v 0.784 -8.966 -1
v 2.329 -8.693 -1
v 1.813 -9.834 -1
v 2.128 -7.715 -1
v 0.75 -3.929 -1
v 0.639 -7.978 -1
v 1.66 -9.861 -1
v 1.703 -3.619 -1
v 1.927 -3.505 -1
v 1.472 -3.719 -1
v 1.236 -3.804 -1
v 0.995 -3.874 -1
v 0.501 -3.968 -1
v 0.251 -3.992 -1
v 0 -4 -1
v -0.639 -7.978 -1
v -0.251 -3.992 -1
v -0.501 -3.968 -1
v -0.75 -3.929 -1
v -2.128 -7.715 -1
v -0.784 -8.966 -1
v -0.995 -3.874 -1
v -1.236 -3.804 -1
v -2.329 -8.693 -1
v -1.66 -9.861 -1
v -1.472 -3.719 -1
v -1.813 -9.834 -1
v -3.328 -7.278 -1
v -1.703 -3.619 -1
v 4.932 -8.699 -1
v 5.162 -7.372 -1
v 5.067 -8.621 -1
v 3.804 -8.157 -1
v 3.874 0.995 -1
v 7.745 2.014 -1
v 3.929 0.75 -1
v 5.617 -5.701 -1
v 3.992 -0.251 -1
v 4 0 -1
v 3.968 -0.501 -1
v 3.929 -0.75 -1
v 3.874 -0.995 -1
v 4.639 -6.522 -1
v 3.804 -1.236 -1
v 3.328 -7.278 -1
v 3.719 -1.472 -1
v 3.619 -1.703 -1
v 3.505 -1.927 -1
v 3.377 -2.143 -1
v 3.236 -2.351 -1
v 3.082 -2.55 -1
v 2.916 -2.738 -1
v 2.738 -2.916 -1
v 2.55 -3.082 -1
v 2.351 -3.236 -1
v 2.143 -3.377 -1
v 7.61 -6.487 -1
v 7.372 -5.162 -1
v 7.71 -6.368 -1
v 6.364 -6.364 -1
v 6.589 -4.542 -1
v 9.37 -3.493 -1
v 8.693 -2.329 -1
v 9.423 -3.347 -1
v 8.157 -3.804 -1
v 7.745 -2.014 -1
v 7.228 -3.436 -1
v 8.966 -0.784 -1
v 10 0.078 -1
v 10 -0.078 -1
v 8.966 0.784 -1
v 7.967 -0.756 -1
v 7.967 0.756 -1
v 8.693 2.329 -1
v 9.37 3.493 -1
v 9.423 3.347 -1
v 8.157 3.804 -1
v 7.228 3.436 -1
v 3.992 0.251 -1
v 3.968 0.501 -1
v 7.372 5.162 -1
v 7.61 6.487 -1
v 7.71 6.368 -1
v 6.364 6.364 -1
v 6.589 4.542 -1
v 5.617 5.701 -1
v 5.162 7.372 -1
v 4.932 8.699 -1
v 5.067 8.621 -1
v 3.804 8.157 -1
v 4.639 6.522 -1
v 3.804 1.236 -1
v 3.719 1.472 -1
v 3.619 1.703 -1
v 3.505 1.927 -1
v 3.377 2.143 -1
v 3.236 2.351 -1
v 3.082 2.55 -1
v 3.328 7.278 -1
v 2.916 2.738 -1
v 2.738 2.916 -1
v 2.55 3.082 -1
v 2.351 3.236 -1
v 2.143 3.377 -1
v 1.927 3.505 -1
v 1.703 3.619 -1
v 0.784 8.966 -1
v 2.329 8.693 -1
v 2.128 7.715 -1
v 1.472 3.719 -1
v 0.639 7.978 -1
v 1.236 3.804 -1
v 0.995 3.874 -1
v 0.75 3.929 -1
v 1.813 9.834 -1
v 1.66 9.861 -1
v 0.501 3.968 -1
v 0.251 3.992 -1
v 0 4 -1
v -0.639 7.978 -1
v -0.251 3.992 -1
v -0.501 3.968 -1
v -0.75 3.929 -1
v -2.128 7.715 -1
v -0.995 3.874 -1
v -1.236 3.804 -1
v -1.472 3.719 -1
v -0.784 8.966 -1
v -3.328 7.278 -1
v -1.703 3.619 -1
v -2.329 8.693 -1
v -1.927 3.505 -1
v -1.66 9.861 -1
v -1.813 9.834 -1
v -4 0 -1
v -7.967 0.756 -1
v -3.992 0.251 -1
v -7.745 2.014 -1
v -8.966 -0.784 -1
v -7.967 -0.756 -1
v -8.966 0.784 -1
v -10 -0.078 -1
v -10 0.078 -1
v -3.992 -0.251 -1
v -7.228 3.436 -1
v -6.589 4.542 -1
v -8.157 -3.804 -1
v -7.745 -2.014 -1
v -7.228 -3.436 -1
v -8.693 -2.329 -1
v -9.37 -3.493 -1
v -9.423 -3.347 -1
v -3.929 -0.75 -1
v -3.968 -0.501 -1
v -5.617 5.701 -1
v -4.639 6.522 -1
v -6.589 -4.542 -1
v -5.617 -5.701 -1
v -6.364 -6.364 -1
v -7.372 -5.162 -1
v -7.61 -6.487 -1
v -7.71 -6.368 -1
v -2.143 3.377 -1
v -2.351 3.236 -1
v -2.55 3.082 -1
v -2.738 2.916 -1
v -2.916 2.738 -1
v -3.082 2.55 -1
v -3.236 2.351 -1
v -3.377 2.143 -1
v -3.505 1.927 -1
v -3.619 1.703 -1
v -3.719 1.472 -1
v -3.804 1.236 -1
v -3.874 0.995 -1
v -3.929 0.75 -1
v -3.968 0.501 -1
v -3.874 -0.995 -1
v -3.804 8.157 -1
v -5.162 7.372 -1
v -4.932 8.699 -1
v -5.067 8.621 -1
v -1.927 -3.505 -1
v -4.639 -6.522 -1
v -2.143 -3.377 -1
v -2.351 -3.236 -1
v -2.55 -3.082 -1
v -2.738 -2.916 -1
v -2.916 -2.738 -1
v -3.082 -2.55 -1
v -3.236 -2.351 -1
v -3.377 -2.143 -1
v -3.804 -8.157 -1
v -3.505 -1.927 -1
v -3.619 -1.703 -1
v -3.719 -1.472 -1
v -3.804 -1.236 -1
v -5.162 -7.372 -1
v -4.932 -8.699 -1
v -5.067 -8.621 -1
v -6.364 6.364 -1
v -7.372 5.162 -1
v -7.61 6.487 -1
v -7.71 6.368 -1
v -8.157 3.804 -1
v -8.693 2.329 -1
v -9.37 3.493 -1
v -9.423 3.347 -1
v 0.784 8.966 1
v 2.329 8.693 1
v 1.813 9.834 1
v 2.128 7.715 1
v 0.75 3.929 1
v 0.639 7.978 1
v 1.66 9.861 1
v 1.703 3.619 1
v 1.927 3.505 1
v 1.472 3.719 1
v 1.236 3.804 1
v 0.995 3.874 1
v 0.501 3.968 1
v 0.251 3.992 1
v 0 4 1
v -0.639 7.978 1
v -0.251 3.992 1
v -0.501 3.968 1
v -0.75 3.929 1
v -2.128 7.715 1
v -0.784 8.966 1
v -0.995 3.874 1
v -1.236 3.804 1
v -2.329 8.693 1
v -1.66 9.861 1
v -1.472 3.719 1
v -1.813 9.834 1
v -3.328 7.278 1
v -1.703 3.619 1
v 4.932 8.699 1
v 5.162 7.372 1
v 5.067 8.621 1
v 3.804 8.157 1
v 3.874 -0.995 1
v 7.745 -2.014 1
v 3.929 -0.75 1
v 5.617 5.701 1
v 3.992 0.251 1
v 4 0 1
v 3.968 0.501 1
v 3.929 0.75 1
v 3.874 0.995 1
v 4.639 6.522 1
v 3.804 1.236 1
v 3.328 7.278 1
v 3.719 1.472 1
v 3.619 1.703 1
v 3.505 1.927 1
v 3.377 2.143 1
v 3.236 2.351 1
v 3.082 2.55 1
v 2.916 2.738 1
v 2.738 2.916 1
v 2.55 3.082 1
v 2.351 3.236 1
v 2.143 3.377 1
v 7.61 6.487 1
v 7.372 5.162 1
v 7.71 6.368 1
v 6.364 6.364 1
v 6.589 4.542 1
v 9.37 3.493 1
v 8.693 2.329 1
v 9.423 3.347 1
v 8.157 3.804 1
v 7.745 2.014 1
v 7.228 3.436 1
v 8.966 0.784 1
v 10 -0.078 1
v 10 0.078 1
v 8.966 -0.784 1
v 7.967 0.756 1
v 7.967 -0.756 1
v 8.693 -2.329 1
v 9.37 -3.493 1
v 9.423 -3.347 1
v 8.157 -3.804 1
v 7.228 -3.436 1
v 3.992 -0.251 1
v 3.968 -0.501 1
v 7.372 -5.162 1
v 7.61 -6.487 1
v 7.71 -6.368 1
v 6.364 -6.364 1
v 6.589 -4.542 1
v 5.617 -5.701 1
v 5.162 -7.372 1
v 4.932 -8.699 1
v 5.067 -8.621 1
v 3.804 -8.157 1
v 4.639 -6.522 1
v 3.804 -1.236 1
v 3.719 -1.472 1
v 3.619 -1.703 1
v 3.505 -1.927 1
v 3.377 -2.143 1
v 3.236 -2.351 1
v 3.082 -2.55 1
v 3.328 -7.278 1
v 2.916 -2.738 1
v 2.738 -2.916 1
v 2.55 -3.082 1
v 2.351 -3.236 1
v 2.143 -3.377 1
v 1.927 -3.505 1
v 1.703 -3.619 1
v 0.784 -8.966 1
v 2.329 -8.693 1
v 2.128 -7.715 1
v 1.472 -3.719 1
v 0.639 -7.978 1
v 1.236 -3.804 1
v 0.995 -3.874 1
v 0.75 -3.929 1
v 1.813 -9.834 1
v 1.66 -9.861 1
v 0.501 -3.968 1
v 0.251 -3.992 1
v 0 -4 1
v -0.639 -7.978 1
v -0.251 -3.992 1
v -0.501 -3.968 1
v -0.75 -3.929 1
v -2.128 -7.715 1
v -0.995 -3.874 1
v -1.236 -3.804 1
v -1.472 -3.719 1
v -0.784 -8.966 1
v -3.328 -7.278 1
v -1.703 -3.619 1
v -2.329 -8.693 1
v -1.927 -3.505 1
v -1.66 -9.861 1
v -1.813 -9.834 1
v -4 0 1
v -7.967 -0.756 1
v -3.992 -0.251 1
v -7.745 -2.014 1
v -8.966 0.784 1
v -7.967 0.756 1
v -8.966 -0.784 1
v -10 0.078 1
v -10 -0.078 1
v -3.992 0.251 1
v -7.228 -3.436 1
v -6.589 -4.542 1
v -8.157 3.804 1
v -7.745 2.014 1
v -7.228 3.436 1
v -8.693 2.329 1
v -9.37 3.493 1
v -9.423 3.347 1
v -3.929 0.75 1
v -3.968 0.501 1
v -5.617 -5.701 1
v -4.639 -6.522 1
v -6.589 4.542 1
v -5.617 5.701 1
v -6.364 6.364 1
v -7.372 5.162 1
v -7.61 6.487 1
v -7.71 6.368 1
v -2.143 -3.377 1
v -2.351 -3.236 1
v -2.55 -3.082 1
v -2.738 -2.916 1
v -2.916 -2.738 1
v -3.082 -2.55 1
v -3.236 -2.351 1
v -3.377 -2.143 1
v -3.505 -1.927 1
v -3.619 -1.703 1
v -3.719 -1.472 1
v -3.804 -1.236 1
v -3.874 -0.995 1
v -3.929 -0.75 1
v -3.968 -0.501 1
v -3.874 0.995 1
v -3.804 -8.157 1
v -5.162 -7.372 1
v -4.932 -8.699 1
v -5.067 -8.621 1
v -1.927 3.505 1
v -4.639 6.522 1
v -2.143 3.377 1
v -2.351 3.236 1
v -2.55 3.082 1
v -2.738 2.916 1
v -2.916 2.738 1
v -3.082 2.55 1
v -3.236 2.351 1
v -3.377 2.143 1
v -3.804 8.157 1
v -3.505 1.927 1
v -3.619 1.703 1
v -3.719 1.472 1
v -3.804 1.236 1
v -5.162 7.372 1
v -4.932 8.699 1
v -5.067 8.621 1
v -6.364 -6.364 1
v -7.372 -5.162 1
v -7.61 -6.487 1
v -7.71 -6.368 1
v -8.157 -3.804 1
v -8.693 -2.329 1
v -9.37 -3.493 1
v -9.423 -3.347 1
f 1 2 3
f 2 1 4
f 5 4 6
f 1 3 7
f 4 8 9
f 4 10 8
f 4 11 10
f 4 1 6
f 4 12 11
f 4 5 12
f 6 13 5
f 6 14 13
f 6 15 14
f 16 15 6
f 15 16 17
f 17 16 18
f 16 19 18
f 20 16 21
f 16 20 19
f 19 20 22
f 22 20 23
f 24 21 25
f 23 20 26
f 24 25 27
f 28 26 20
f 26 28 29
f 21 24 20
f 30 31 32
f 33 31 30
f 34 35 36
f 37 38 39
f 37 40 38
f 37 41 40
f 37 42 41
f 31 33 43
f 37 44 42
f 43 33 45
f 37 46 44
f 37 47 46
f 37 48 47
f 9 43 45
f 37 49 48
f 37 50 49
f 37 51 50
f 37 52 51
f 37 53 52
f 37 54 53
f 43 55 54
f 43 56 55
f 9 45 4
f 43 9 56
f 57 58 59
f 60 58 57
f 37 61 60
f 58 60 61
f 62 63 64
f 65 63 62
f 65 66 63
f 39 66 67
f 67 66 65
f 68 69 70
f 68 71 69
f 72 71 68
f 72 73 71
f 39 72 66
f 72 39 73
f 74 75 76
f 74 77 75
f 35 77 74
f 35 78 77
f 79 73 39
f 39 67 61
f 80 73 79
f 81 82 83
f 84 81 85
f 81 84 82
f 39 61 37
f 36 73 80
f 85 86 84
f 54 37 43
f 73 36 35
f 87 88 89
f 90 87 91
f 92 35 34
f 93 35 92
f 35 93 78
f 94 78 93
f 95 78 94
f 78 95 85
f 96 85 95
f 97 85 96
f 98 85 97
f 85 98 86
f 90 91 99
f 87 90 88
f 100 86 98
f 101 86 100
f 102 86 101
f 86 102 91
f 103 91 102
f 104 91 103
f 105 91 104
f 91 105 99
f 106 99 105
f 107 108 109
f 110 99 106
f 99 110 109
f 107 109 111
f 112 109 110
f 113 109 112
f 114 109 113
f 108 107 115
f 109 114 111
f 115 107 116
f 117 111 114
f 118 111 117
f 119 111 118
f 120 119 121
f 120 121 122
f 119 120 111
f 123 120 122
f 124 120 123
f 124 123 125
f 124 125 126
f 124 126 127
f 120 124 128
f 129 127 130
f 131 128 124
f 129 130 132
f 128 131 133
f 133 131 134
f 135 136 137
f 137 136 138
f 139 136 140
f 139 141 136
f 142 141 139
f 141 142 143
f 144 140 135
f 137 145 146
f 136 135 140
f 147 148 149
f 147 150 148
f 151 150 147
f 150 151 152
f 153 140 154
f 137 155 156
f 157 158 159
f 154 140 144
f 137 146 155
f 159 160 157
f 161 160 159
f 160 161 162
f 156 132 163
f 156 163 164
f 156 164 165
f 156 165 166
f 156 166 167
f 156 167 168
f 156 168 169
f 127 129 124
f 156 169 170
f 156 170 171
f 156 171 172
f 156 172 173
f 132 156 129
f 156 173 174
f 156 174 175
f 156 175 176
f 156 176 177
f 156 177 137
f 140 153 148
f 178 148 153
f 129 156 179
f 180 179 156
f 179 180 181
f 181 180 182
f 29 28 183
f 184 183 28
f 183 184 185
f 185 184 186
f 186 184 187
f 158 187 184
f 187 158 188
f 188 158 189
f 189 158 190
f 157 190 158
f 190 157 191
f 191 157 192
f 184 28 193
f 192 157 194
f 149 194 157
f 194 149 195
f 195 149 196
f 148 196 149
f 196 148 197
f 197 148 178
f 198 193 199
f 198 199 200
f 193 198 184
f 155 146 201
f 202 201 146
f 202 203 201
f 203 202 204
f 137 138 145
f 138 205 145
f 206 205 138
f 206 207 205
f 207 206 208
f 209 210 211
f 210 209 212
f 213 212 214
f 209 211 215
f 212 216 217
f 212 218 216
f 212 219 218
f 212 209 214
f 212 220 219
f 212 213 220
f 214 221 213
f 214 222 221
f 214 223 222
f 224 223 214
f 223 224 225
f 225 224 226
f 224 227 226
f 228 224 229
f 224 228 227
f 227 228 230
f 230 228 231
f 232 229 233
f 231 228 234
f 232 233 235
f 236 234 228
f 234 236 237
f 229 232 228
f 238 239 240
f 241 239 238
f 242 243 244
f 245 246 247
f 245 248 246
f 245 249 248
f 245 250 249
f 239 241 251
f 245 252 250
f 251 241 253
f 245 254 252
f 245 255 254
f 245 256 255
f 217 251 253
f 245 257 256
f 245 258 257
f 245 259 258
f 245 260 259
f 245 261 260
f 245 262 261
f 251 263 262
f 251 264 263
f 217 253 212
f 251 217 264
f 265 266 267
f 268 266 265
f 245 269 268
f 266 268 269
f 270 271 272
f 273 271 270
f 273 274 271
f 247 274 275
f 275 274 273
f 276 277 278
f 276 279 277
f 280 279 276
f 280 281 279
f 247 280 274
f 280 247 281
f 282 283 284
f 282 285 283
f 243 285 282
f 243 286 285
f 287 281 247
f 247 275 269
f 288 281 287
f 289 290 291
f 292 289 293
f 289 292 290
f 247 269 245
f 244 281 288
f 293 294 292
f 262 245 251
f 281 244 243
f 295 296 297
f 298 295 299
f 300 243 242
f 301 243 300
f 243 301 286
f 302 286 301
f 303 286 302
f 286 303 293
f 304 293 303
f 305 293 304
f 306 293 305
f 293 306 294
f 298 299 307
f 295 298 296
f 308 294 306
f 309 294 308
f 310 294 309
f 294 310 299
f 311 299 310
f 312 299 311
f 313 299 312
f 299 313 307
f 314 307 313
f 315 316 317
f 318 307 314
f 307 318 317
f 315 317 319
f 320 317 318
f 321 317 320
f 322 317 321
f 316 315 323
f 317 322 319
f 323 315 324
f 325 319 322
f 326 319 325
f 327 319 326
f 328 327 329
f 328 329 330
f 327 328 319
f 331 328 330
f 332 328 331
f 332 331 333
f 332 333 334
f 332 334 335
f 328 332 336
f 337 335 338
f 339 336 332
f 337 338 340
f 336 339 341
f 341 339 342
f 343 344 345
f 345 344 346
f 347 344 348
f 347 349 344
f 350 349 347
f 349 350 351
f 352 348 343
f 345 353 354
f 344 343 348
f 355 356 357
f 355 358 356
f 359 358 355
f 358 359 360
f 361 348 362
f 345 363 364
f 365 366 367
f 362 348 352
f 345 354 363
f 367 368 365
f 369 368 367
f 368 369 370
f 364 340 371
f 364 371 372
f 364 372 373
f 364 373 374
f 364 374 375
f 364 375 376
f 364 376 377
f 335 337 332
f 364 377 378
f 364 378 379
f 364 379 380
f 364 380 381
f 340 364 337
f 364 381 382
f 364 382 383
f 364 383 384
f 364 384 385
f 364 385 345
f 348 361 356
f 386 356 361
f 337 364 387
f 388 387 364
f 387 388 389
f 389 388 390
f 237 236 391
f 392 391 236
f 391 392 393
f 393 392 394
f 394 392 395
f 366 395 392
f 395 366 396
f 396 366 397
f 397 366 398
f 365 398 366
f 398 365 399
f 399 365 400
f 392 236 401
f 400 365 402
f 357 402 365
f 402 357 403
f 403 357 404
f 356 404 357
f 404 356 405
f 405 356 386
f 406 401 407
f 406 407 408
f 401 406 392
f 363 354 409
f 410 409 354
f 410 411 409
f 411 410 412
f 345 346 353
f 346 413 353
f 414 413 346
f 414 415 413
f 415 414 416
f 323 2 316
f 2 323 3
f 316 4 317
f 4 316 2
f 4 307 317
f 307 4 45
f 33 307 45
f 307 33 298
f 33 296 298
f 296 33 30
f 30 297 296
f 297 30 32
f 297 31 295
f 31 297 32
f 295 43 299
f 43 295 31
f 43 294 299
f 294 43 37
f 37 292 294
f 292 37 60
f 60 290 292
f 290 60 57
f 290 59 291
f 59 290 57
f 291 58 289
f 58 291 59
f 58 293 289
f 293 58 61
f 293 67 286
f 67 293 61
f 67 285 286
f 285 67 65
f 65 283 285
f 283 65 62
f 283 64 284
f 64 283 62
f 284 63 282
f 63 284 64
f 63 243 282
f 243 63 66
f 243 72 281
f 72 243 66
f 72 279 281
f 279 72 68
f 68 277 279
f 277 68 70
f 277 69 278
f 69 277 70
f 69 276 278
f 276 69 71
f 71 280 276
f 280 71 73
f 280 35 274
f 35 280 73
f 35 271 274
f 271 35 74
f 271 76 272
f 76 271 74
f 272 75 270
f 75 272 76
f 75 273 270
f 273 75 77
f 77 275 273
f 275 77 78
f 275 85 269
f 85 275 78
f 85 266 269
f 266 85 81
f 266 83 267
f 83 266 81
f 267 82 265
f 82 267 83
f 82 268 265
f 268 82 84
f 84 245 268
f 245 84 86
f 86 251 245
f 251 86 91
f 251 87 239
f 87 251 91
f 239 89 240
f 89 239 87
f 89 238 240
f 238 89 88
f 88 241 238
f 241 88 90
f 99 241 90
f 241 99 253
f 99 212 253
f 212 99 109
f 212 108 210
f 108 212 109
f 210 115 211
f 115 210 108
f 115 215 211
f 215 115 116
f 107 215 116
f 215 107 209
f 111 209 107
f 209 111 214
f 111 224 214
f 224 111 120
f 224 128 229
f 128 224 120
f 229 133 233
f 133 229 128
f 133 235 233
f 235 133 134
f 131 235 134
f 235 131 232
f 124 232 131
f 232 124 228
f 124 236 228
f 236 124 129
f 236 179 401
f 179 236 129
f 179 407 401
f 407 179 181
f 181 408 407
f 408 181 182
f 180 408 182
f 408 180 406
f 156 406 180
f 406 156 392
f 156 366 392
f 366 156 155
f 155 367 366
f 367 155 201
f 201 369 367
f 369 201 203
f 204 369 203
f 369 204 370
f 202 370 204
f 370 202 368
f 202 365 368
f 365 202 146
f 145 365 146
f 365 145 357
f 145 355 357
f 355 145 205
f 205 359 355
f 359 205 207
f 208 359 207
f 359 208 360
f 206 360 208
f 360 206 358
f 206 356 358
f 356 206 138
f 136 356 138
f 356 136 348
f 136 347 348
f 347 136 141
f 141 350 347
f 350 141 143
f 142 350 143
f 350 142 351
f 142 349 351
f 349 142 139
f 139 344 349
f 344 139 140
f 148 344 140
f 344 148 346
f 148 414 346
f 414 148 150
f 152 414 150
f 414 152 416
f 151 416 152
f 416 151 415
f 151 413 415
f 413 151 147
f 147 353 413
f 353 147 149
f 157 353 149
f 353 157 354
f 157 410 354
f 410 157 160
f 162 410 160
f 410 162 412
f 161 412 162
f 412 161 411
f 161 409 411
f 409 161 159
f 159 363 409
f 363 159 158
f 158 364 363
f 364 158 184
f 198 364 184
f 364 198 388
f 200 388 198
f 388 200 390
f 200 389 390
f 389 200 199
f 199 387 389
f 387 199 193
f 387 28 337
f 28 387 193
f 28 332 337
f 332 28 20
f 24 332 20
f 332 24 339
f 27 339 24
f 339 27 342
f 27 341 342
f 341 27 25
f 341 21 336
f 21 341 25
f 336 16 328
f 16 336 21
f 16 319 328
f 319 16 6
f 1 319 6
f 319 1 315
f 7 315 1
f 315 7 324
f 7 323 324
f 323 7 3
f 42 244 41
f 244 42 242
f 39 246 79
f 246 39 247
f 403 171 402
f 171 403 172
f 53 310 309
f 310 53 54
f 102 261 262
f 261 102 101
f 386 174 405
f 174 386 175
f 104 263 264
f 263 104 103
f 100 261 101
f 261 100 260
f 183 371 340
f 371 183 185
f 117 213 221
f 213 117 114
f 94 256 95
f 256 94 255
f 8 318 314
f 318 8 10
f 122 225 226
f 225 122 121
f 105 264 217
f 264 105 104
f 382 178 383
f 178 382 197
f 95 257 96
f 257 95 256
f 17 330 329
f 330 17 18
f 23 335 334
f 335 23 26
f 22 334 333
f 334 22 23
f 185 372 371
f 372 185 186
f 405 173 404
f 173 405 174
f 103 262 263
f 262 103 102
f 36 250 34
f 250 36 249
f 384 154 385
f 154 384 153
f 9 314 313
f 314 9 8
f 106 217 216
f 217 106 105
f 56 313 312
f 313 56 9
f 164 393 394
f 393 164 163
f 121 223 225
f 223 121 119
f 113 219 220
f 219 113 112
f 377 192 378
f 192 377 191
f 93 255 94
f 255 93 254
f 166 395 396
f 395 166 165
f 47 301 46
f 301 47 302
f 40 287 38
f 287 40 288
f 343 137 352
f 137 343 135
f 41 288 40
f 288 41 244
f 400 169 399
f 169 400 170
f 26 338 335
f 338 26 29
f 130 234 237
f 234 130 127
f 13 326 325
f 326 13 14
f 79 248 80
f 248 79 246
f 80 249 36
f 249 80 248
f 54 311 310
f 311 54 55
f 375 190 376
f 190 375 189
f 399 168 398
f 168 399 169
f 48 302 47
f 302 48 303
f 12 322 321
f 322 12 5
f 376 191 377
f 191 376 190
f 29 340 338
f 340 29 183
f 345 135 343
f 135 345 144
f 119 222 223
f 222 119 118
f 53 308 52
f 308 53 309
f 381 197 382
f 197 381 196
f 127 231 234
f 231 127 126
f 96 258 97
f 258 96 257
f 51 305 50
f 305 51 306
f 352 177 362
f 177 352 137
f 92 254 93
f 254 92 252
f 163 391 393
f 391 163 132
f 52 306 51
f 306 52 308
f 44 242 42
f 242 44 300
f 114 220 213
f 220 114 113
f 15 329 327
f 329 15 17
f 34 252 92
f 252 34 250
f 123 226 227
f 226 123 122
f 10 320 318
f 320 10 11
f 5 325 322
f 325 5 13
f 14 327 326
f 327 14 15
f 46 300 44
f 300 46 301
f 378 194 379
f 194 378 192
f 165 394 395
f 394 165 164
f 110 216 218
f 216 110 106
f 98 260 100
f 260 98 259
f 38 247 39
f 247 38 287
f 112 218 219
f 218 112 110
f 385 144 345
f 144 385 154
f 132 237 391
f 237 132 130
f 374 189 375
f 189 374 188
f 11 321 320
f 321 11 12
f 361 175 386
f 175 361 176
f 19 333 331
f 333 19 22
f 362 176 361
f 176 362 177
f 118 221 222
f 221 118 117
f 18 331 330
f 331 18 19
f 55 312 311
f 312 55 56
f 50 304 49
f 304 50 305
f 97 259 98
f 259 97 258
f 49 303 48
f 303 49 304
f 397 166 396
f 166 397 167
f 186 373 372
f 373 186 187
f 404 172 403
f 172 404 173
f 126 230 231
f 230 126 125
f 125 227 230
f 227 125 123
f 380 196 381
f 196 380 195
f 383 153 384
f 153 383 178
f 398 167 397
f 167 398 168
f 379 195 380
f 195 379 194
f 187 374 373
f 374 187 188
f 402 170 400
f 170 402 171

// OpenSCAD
height = 2;
type = "Spur"; // [Spur,Cog,Double Helix, Single Helix]
teeth = 18;	//	[8:50]

hole = "Yes"; //[Yes,No]
rotate_Offset_double_Helix_only = 5; //[0:20]

holeSize = 4.0;//don't make too big or your gear will disappear
scale = 100;//this is here temperarily I would not reccomend changing!


if (type == "Spur")
{
if(hole == "Yes")
{
hole();
}
else
{
spur();
}
}
else if(type == "Cog")
{
if(hole == "Yes")
{
hole();
}
else
{
cog();
}
}
else if(type == "Double Helix")
{

if(hole == "Yes")
{
hole();
}
else
{
double_helix();
}
}
else if (type == "Single Helix")
{
if(hole == "Yes")
{
hole();
}
else
{
single_helix();
}
}


module gear(number_of_teeth,
		circular_pitch=false, diametral_pitch=false,
		pressure_angle=20, clearance = 0)
{

	//Convert diametrial pitch to our native circular pitch
	circular_pitch = (circular_pitch!=false?circular_pitch:180/diametral_pitch);

	// Pitch diameter: Diameter of pitch circle.
	pitch_diameter  =  number_of_teeth * circular_pitch / 180;
	pitch_radius = pitch_diameter/2;

	// Base Circle
	base_diameter = pitch_diameter*cos(pressure_angle);
	base_radius = base_diameter/2;

	// Diametrial pitch: Number of teeth per unit length.
	pitch_diametrial = number_of_teeth / pitch_diameter;

	// Addendum: Radial distance from pitch circle to outside circle.
	addendum = 1/pitch_diametrial;

	//Outer Circle
	outer_radius = pitch_radius+addendum;
	outer_diameter = outer_radius*2;

	// Dedendum: Radial distance from pitch circle to root diameter
	dedendum = addendum + clearance;

	// Root diameter: Diameter of bottom of tooth spaces.
	root_radius = pitch_radius-dedendum;
	root_diameter = root_radius * 2;

	half_thick_angle = 360 / (4 * number_of_teeth);

	union()
	{
		rotate(half_thick_angle) circle($fn=number_of_teeth*2, r=root_radius*1.001);

		for (i= [1:number_of_teeth])
		//for (i = [0])
		{
			rotate([0,0,i*360/number_of_teeth])
			{
				involute_gear_tooth(
					pitch_radius = pitch_radius,
					root_radius = root_radius,
					base_radius = base_radius-6,
					outer_radius = outer_radius,
					half_thick_angle = half_thick_angle);
			}
		}
	}
}


module involute_gear_tooth(
					pitch_radius,
					root_radius,
					base_radius,
					outer_radius,
					half_thick_angle
					)
{
	pitch_to_base_angle  = involute_intersect_angle( base_radius, pitch_radius );

	outer_to_base_angle = involute_intersect_angle( base_radius/2, outer_radius*1);

	base1 = 0 - pitch_to_base_angle - half_thick_angle;
	pitch1 = 0 - half_thick_angle;
	outer1 = outer_to_base_angle - pitch_to_base_angle - half_thick_angle;

	b1 = polar_to_cartesian([ base1, base_radius ]);
	p1 = polar_to_cartesian([ pitch1, pitch_radius ]);
	o1 = polar_to_cartesian([ outer1, outer_radius ]);

	b2 = polar_to_cartesian([ -base1, base_radius ]);
	p2 = polar_to_cartesian([ -pitch1, pitch_radius ]);
	o2 = polar_to_cartesian([ -outer1, outer_radius ]);

	// ( root_radius > base_radius variables )
		pitch_to_root_angle = pitch_to_base_angle - involute_intersect_angle(base_radius, root_radius );
		root1 = pitch1 - pitch_to_root_angle;
		root2 = -pitch1 + pitch_to_root_angle;
		r1_t =  polar_to_cartesian([ root1, root_radius ]);
		r2_t =  polar_to_cartesian([ -root1, root_radius ]);

	// ( else )
		r1_f =  polar_to_cartesian([ base1, root_radius ]);
		r2_f =  polar_to_cartesian([ -base1, root_radius ]);

	if (root_radius > base_radius)
	{
		//echo("true");
		polygon( points = [
			r1_t,p1,o1,o2,p2,r2_t
		], convexity = 3);
	}
	else
	{
		polygon( points = [
			r1_f, b1,p1,o1,o2,p2,b2,r2_f
		], convexity = 3);
	}

}

// Mathematical Functions
//===============

// Finds the angle of the involute about the base radius at the given distance (radius) from it's center.
//source: http://www.mathhelpforum.com/math-help/geometry/136011-circle-involute-solving-y-any-given-x.html

function involute_intersect_angle(base_radius, radius) = sqrt( pow(radius/base_radius,2) - 1);



// Polar coord [angle, radius] to cartesian coord [x,y]

function polar_to_cartesian(polar) = [
	polar[1]*cos(polar[0]),
	polar[1]*sin(polar[0])
];


// Test Cases
//===============

module test_gears()
{
	gear(number_of_teeth=51,circular_pitch=200);
	translate([0, 50])gear(number_of_teeth=17,circular_pitch=200);
	translate([-50,0]) gear(number_of_teeth=17,diametral_pitch=1);
}
module cog()
{
		gear(number_of_teeth=teeth,diametral_pitch=scale/100);

}
module single_helix()
{
	translate([50,0]);
	{
	linear_extrude(height = height, center = true, convexity = 10, twist = -45)
	 gear(number_of_teeth=teeth,diametral_pitch=scale/100);
	}
}
module double_helix()
{



linear_extrude(height = height, center = true, convexity = 10, twist = -45)
	 gear(number_of_teeth=teeth,diametral_pitch=scale/100);
	translate([0,0,height])
	rotate([0,0,rotate_Offset_double_Helix_only])
 linear_extrude(height = height, center = true, convexity = 10, twist = 45)
	 gear(number_of_teeth=teeth,diametral_pitch=scale/100);

}
module spur()
{

		translate([0,0]) linear_extrude(height = height, center = true, convexity = 10, twist = 0)
	 gear(number_of_teeth=teeth,diametral_pitch=1);


}

module demo_3d_gears()
{
	//double helical gear
	// (helics don't line up perfectly - for display purposes only ;)
	translate([50,0])
	{
	linear_extrude(height = 10, center = true, convexity = 10, twist = -45)
	 gear(number_of_teeth=17,diametral_pitch=1);
	translate([0,0,10]) linear_extrude(height = height, center = true, convexity = 10, twist = 45)
	 gear(number_of_teeth=17,diametral_pitch=1);
	}

	//spur gear
	translate([0,-50]) linear_extrude(height = height, center = true, convexity = 10, twist = 0)
	 gear(number_of_teeth=17,diametral_pitch=1);

}
module hole() {
   difference() {
if(type == "Spur")
{
translate([0,0]) linear_extrude(height = height, center = true, convexity = 10, twist = 0)
	 gear(number_of_teeth=teeth,diametral_pitch=1);
}
else if(type == "Cog")
{
gear(number_of_teeth=teeth,diametral_pitch=scale/100);
}
else if (type == "Double Helix")
{
linear_extrude(height = height, center = true, convexity = 10, twist = -45)
	 gear(number_of_teeth=teeth,diametral_pitch=scale/100);
	translate([0,0,height])
	rotate([0,0,rotate_Offset_double_Helix_only])
 linear_extrude(height = height, center = true, convexity = 10, twist = 45)
	 gear(number_of_teeth=teeth,diametral_pitch=scale/100);

}
else if (type == "Single Helix")
{
linear_extrude(height = height, center = true, convexity = 10, twist = -45)
	 gear(number_of_teeth=teeth,diametral_pitch=scale/100);
}
 rotate ([0,0,0]) cylinder (h = height*4, r=holeSize, center = true, $fn=100);
}
}




module test_involute_curve()
{
	for (i=[0,1,2,3,4,5,6,7,8,9,10,11,12,13,14,15])
	{
		translate(polar_to_cartesian([involute_intersect_angle( 0.1,i) , i ])) circle($fn=15, r=0.5);
	}
}
